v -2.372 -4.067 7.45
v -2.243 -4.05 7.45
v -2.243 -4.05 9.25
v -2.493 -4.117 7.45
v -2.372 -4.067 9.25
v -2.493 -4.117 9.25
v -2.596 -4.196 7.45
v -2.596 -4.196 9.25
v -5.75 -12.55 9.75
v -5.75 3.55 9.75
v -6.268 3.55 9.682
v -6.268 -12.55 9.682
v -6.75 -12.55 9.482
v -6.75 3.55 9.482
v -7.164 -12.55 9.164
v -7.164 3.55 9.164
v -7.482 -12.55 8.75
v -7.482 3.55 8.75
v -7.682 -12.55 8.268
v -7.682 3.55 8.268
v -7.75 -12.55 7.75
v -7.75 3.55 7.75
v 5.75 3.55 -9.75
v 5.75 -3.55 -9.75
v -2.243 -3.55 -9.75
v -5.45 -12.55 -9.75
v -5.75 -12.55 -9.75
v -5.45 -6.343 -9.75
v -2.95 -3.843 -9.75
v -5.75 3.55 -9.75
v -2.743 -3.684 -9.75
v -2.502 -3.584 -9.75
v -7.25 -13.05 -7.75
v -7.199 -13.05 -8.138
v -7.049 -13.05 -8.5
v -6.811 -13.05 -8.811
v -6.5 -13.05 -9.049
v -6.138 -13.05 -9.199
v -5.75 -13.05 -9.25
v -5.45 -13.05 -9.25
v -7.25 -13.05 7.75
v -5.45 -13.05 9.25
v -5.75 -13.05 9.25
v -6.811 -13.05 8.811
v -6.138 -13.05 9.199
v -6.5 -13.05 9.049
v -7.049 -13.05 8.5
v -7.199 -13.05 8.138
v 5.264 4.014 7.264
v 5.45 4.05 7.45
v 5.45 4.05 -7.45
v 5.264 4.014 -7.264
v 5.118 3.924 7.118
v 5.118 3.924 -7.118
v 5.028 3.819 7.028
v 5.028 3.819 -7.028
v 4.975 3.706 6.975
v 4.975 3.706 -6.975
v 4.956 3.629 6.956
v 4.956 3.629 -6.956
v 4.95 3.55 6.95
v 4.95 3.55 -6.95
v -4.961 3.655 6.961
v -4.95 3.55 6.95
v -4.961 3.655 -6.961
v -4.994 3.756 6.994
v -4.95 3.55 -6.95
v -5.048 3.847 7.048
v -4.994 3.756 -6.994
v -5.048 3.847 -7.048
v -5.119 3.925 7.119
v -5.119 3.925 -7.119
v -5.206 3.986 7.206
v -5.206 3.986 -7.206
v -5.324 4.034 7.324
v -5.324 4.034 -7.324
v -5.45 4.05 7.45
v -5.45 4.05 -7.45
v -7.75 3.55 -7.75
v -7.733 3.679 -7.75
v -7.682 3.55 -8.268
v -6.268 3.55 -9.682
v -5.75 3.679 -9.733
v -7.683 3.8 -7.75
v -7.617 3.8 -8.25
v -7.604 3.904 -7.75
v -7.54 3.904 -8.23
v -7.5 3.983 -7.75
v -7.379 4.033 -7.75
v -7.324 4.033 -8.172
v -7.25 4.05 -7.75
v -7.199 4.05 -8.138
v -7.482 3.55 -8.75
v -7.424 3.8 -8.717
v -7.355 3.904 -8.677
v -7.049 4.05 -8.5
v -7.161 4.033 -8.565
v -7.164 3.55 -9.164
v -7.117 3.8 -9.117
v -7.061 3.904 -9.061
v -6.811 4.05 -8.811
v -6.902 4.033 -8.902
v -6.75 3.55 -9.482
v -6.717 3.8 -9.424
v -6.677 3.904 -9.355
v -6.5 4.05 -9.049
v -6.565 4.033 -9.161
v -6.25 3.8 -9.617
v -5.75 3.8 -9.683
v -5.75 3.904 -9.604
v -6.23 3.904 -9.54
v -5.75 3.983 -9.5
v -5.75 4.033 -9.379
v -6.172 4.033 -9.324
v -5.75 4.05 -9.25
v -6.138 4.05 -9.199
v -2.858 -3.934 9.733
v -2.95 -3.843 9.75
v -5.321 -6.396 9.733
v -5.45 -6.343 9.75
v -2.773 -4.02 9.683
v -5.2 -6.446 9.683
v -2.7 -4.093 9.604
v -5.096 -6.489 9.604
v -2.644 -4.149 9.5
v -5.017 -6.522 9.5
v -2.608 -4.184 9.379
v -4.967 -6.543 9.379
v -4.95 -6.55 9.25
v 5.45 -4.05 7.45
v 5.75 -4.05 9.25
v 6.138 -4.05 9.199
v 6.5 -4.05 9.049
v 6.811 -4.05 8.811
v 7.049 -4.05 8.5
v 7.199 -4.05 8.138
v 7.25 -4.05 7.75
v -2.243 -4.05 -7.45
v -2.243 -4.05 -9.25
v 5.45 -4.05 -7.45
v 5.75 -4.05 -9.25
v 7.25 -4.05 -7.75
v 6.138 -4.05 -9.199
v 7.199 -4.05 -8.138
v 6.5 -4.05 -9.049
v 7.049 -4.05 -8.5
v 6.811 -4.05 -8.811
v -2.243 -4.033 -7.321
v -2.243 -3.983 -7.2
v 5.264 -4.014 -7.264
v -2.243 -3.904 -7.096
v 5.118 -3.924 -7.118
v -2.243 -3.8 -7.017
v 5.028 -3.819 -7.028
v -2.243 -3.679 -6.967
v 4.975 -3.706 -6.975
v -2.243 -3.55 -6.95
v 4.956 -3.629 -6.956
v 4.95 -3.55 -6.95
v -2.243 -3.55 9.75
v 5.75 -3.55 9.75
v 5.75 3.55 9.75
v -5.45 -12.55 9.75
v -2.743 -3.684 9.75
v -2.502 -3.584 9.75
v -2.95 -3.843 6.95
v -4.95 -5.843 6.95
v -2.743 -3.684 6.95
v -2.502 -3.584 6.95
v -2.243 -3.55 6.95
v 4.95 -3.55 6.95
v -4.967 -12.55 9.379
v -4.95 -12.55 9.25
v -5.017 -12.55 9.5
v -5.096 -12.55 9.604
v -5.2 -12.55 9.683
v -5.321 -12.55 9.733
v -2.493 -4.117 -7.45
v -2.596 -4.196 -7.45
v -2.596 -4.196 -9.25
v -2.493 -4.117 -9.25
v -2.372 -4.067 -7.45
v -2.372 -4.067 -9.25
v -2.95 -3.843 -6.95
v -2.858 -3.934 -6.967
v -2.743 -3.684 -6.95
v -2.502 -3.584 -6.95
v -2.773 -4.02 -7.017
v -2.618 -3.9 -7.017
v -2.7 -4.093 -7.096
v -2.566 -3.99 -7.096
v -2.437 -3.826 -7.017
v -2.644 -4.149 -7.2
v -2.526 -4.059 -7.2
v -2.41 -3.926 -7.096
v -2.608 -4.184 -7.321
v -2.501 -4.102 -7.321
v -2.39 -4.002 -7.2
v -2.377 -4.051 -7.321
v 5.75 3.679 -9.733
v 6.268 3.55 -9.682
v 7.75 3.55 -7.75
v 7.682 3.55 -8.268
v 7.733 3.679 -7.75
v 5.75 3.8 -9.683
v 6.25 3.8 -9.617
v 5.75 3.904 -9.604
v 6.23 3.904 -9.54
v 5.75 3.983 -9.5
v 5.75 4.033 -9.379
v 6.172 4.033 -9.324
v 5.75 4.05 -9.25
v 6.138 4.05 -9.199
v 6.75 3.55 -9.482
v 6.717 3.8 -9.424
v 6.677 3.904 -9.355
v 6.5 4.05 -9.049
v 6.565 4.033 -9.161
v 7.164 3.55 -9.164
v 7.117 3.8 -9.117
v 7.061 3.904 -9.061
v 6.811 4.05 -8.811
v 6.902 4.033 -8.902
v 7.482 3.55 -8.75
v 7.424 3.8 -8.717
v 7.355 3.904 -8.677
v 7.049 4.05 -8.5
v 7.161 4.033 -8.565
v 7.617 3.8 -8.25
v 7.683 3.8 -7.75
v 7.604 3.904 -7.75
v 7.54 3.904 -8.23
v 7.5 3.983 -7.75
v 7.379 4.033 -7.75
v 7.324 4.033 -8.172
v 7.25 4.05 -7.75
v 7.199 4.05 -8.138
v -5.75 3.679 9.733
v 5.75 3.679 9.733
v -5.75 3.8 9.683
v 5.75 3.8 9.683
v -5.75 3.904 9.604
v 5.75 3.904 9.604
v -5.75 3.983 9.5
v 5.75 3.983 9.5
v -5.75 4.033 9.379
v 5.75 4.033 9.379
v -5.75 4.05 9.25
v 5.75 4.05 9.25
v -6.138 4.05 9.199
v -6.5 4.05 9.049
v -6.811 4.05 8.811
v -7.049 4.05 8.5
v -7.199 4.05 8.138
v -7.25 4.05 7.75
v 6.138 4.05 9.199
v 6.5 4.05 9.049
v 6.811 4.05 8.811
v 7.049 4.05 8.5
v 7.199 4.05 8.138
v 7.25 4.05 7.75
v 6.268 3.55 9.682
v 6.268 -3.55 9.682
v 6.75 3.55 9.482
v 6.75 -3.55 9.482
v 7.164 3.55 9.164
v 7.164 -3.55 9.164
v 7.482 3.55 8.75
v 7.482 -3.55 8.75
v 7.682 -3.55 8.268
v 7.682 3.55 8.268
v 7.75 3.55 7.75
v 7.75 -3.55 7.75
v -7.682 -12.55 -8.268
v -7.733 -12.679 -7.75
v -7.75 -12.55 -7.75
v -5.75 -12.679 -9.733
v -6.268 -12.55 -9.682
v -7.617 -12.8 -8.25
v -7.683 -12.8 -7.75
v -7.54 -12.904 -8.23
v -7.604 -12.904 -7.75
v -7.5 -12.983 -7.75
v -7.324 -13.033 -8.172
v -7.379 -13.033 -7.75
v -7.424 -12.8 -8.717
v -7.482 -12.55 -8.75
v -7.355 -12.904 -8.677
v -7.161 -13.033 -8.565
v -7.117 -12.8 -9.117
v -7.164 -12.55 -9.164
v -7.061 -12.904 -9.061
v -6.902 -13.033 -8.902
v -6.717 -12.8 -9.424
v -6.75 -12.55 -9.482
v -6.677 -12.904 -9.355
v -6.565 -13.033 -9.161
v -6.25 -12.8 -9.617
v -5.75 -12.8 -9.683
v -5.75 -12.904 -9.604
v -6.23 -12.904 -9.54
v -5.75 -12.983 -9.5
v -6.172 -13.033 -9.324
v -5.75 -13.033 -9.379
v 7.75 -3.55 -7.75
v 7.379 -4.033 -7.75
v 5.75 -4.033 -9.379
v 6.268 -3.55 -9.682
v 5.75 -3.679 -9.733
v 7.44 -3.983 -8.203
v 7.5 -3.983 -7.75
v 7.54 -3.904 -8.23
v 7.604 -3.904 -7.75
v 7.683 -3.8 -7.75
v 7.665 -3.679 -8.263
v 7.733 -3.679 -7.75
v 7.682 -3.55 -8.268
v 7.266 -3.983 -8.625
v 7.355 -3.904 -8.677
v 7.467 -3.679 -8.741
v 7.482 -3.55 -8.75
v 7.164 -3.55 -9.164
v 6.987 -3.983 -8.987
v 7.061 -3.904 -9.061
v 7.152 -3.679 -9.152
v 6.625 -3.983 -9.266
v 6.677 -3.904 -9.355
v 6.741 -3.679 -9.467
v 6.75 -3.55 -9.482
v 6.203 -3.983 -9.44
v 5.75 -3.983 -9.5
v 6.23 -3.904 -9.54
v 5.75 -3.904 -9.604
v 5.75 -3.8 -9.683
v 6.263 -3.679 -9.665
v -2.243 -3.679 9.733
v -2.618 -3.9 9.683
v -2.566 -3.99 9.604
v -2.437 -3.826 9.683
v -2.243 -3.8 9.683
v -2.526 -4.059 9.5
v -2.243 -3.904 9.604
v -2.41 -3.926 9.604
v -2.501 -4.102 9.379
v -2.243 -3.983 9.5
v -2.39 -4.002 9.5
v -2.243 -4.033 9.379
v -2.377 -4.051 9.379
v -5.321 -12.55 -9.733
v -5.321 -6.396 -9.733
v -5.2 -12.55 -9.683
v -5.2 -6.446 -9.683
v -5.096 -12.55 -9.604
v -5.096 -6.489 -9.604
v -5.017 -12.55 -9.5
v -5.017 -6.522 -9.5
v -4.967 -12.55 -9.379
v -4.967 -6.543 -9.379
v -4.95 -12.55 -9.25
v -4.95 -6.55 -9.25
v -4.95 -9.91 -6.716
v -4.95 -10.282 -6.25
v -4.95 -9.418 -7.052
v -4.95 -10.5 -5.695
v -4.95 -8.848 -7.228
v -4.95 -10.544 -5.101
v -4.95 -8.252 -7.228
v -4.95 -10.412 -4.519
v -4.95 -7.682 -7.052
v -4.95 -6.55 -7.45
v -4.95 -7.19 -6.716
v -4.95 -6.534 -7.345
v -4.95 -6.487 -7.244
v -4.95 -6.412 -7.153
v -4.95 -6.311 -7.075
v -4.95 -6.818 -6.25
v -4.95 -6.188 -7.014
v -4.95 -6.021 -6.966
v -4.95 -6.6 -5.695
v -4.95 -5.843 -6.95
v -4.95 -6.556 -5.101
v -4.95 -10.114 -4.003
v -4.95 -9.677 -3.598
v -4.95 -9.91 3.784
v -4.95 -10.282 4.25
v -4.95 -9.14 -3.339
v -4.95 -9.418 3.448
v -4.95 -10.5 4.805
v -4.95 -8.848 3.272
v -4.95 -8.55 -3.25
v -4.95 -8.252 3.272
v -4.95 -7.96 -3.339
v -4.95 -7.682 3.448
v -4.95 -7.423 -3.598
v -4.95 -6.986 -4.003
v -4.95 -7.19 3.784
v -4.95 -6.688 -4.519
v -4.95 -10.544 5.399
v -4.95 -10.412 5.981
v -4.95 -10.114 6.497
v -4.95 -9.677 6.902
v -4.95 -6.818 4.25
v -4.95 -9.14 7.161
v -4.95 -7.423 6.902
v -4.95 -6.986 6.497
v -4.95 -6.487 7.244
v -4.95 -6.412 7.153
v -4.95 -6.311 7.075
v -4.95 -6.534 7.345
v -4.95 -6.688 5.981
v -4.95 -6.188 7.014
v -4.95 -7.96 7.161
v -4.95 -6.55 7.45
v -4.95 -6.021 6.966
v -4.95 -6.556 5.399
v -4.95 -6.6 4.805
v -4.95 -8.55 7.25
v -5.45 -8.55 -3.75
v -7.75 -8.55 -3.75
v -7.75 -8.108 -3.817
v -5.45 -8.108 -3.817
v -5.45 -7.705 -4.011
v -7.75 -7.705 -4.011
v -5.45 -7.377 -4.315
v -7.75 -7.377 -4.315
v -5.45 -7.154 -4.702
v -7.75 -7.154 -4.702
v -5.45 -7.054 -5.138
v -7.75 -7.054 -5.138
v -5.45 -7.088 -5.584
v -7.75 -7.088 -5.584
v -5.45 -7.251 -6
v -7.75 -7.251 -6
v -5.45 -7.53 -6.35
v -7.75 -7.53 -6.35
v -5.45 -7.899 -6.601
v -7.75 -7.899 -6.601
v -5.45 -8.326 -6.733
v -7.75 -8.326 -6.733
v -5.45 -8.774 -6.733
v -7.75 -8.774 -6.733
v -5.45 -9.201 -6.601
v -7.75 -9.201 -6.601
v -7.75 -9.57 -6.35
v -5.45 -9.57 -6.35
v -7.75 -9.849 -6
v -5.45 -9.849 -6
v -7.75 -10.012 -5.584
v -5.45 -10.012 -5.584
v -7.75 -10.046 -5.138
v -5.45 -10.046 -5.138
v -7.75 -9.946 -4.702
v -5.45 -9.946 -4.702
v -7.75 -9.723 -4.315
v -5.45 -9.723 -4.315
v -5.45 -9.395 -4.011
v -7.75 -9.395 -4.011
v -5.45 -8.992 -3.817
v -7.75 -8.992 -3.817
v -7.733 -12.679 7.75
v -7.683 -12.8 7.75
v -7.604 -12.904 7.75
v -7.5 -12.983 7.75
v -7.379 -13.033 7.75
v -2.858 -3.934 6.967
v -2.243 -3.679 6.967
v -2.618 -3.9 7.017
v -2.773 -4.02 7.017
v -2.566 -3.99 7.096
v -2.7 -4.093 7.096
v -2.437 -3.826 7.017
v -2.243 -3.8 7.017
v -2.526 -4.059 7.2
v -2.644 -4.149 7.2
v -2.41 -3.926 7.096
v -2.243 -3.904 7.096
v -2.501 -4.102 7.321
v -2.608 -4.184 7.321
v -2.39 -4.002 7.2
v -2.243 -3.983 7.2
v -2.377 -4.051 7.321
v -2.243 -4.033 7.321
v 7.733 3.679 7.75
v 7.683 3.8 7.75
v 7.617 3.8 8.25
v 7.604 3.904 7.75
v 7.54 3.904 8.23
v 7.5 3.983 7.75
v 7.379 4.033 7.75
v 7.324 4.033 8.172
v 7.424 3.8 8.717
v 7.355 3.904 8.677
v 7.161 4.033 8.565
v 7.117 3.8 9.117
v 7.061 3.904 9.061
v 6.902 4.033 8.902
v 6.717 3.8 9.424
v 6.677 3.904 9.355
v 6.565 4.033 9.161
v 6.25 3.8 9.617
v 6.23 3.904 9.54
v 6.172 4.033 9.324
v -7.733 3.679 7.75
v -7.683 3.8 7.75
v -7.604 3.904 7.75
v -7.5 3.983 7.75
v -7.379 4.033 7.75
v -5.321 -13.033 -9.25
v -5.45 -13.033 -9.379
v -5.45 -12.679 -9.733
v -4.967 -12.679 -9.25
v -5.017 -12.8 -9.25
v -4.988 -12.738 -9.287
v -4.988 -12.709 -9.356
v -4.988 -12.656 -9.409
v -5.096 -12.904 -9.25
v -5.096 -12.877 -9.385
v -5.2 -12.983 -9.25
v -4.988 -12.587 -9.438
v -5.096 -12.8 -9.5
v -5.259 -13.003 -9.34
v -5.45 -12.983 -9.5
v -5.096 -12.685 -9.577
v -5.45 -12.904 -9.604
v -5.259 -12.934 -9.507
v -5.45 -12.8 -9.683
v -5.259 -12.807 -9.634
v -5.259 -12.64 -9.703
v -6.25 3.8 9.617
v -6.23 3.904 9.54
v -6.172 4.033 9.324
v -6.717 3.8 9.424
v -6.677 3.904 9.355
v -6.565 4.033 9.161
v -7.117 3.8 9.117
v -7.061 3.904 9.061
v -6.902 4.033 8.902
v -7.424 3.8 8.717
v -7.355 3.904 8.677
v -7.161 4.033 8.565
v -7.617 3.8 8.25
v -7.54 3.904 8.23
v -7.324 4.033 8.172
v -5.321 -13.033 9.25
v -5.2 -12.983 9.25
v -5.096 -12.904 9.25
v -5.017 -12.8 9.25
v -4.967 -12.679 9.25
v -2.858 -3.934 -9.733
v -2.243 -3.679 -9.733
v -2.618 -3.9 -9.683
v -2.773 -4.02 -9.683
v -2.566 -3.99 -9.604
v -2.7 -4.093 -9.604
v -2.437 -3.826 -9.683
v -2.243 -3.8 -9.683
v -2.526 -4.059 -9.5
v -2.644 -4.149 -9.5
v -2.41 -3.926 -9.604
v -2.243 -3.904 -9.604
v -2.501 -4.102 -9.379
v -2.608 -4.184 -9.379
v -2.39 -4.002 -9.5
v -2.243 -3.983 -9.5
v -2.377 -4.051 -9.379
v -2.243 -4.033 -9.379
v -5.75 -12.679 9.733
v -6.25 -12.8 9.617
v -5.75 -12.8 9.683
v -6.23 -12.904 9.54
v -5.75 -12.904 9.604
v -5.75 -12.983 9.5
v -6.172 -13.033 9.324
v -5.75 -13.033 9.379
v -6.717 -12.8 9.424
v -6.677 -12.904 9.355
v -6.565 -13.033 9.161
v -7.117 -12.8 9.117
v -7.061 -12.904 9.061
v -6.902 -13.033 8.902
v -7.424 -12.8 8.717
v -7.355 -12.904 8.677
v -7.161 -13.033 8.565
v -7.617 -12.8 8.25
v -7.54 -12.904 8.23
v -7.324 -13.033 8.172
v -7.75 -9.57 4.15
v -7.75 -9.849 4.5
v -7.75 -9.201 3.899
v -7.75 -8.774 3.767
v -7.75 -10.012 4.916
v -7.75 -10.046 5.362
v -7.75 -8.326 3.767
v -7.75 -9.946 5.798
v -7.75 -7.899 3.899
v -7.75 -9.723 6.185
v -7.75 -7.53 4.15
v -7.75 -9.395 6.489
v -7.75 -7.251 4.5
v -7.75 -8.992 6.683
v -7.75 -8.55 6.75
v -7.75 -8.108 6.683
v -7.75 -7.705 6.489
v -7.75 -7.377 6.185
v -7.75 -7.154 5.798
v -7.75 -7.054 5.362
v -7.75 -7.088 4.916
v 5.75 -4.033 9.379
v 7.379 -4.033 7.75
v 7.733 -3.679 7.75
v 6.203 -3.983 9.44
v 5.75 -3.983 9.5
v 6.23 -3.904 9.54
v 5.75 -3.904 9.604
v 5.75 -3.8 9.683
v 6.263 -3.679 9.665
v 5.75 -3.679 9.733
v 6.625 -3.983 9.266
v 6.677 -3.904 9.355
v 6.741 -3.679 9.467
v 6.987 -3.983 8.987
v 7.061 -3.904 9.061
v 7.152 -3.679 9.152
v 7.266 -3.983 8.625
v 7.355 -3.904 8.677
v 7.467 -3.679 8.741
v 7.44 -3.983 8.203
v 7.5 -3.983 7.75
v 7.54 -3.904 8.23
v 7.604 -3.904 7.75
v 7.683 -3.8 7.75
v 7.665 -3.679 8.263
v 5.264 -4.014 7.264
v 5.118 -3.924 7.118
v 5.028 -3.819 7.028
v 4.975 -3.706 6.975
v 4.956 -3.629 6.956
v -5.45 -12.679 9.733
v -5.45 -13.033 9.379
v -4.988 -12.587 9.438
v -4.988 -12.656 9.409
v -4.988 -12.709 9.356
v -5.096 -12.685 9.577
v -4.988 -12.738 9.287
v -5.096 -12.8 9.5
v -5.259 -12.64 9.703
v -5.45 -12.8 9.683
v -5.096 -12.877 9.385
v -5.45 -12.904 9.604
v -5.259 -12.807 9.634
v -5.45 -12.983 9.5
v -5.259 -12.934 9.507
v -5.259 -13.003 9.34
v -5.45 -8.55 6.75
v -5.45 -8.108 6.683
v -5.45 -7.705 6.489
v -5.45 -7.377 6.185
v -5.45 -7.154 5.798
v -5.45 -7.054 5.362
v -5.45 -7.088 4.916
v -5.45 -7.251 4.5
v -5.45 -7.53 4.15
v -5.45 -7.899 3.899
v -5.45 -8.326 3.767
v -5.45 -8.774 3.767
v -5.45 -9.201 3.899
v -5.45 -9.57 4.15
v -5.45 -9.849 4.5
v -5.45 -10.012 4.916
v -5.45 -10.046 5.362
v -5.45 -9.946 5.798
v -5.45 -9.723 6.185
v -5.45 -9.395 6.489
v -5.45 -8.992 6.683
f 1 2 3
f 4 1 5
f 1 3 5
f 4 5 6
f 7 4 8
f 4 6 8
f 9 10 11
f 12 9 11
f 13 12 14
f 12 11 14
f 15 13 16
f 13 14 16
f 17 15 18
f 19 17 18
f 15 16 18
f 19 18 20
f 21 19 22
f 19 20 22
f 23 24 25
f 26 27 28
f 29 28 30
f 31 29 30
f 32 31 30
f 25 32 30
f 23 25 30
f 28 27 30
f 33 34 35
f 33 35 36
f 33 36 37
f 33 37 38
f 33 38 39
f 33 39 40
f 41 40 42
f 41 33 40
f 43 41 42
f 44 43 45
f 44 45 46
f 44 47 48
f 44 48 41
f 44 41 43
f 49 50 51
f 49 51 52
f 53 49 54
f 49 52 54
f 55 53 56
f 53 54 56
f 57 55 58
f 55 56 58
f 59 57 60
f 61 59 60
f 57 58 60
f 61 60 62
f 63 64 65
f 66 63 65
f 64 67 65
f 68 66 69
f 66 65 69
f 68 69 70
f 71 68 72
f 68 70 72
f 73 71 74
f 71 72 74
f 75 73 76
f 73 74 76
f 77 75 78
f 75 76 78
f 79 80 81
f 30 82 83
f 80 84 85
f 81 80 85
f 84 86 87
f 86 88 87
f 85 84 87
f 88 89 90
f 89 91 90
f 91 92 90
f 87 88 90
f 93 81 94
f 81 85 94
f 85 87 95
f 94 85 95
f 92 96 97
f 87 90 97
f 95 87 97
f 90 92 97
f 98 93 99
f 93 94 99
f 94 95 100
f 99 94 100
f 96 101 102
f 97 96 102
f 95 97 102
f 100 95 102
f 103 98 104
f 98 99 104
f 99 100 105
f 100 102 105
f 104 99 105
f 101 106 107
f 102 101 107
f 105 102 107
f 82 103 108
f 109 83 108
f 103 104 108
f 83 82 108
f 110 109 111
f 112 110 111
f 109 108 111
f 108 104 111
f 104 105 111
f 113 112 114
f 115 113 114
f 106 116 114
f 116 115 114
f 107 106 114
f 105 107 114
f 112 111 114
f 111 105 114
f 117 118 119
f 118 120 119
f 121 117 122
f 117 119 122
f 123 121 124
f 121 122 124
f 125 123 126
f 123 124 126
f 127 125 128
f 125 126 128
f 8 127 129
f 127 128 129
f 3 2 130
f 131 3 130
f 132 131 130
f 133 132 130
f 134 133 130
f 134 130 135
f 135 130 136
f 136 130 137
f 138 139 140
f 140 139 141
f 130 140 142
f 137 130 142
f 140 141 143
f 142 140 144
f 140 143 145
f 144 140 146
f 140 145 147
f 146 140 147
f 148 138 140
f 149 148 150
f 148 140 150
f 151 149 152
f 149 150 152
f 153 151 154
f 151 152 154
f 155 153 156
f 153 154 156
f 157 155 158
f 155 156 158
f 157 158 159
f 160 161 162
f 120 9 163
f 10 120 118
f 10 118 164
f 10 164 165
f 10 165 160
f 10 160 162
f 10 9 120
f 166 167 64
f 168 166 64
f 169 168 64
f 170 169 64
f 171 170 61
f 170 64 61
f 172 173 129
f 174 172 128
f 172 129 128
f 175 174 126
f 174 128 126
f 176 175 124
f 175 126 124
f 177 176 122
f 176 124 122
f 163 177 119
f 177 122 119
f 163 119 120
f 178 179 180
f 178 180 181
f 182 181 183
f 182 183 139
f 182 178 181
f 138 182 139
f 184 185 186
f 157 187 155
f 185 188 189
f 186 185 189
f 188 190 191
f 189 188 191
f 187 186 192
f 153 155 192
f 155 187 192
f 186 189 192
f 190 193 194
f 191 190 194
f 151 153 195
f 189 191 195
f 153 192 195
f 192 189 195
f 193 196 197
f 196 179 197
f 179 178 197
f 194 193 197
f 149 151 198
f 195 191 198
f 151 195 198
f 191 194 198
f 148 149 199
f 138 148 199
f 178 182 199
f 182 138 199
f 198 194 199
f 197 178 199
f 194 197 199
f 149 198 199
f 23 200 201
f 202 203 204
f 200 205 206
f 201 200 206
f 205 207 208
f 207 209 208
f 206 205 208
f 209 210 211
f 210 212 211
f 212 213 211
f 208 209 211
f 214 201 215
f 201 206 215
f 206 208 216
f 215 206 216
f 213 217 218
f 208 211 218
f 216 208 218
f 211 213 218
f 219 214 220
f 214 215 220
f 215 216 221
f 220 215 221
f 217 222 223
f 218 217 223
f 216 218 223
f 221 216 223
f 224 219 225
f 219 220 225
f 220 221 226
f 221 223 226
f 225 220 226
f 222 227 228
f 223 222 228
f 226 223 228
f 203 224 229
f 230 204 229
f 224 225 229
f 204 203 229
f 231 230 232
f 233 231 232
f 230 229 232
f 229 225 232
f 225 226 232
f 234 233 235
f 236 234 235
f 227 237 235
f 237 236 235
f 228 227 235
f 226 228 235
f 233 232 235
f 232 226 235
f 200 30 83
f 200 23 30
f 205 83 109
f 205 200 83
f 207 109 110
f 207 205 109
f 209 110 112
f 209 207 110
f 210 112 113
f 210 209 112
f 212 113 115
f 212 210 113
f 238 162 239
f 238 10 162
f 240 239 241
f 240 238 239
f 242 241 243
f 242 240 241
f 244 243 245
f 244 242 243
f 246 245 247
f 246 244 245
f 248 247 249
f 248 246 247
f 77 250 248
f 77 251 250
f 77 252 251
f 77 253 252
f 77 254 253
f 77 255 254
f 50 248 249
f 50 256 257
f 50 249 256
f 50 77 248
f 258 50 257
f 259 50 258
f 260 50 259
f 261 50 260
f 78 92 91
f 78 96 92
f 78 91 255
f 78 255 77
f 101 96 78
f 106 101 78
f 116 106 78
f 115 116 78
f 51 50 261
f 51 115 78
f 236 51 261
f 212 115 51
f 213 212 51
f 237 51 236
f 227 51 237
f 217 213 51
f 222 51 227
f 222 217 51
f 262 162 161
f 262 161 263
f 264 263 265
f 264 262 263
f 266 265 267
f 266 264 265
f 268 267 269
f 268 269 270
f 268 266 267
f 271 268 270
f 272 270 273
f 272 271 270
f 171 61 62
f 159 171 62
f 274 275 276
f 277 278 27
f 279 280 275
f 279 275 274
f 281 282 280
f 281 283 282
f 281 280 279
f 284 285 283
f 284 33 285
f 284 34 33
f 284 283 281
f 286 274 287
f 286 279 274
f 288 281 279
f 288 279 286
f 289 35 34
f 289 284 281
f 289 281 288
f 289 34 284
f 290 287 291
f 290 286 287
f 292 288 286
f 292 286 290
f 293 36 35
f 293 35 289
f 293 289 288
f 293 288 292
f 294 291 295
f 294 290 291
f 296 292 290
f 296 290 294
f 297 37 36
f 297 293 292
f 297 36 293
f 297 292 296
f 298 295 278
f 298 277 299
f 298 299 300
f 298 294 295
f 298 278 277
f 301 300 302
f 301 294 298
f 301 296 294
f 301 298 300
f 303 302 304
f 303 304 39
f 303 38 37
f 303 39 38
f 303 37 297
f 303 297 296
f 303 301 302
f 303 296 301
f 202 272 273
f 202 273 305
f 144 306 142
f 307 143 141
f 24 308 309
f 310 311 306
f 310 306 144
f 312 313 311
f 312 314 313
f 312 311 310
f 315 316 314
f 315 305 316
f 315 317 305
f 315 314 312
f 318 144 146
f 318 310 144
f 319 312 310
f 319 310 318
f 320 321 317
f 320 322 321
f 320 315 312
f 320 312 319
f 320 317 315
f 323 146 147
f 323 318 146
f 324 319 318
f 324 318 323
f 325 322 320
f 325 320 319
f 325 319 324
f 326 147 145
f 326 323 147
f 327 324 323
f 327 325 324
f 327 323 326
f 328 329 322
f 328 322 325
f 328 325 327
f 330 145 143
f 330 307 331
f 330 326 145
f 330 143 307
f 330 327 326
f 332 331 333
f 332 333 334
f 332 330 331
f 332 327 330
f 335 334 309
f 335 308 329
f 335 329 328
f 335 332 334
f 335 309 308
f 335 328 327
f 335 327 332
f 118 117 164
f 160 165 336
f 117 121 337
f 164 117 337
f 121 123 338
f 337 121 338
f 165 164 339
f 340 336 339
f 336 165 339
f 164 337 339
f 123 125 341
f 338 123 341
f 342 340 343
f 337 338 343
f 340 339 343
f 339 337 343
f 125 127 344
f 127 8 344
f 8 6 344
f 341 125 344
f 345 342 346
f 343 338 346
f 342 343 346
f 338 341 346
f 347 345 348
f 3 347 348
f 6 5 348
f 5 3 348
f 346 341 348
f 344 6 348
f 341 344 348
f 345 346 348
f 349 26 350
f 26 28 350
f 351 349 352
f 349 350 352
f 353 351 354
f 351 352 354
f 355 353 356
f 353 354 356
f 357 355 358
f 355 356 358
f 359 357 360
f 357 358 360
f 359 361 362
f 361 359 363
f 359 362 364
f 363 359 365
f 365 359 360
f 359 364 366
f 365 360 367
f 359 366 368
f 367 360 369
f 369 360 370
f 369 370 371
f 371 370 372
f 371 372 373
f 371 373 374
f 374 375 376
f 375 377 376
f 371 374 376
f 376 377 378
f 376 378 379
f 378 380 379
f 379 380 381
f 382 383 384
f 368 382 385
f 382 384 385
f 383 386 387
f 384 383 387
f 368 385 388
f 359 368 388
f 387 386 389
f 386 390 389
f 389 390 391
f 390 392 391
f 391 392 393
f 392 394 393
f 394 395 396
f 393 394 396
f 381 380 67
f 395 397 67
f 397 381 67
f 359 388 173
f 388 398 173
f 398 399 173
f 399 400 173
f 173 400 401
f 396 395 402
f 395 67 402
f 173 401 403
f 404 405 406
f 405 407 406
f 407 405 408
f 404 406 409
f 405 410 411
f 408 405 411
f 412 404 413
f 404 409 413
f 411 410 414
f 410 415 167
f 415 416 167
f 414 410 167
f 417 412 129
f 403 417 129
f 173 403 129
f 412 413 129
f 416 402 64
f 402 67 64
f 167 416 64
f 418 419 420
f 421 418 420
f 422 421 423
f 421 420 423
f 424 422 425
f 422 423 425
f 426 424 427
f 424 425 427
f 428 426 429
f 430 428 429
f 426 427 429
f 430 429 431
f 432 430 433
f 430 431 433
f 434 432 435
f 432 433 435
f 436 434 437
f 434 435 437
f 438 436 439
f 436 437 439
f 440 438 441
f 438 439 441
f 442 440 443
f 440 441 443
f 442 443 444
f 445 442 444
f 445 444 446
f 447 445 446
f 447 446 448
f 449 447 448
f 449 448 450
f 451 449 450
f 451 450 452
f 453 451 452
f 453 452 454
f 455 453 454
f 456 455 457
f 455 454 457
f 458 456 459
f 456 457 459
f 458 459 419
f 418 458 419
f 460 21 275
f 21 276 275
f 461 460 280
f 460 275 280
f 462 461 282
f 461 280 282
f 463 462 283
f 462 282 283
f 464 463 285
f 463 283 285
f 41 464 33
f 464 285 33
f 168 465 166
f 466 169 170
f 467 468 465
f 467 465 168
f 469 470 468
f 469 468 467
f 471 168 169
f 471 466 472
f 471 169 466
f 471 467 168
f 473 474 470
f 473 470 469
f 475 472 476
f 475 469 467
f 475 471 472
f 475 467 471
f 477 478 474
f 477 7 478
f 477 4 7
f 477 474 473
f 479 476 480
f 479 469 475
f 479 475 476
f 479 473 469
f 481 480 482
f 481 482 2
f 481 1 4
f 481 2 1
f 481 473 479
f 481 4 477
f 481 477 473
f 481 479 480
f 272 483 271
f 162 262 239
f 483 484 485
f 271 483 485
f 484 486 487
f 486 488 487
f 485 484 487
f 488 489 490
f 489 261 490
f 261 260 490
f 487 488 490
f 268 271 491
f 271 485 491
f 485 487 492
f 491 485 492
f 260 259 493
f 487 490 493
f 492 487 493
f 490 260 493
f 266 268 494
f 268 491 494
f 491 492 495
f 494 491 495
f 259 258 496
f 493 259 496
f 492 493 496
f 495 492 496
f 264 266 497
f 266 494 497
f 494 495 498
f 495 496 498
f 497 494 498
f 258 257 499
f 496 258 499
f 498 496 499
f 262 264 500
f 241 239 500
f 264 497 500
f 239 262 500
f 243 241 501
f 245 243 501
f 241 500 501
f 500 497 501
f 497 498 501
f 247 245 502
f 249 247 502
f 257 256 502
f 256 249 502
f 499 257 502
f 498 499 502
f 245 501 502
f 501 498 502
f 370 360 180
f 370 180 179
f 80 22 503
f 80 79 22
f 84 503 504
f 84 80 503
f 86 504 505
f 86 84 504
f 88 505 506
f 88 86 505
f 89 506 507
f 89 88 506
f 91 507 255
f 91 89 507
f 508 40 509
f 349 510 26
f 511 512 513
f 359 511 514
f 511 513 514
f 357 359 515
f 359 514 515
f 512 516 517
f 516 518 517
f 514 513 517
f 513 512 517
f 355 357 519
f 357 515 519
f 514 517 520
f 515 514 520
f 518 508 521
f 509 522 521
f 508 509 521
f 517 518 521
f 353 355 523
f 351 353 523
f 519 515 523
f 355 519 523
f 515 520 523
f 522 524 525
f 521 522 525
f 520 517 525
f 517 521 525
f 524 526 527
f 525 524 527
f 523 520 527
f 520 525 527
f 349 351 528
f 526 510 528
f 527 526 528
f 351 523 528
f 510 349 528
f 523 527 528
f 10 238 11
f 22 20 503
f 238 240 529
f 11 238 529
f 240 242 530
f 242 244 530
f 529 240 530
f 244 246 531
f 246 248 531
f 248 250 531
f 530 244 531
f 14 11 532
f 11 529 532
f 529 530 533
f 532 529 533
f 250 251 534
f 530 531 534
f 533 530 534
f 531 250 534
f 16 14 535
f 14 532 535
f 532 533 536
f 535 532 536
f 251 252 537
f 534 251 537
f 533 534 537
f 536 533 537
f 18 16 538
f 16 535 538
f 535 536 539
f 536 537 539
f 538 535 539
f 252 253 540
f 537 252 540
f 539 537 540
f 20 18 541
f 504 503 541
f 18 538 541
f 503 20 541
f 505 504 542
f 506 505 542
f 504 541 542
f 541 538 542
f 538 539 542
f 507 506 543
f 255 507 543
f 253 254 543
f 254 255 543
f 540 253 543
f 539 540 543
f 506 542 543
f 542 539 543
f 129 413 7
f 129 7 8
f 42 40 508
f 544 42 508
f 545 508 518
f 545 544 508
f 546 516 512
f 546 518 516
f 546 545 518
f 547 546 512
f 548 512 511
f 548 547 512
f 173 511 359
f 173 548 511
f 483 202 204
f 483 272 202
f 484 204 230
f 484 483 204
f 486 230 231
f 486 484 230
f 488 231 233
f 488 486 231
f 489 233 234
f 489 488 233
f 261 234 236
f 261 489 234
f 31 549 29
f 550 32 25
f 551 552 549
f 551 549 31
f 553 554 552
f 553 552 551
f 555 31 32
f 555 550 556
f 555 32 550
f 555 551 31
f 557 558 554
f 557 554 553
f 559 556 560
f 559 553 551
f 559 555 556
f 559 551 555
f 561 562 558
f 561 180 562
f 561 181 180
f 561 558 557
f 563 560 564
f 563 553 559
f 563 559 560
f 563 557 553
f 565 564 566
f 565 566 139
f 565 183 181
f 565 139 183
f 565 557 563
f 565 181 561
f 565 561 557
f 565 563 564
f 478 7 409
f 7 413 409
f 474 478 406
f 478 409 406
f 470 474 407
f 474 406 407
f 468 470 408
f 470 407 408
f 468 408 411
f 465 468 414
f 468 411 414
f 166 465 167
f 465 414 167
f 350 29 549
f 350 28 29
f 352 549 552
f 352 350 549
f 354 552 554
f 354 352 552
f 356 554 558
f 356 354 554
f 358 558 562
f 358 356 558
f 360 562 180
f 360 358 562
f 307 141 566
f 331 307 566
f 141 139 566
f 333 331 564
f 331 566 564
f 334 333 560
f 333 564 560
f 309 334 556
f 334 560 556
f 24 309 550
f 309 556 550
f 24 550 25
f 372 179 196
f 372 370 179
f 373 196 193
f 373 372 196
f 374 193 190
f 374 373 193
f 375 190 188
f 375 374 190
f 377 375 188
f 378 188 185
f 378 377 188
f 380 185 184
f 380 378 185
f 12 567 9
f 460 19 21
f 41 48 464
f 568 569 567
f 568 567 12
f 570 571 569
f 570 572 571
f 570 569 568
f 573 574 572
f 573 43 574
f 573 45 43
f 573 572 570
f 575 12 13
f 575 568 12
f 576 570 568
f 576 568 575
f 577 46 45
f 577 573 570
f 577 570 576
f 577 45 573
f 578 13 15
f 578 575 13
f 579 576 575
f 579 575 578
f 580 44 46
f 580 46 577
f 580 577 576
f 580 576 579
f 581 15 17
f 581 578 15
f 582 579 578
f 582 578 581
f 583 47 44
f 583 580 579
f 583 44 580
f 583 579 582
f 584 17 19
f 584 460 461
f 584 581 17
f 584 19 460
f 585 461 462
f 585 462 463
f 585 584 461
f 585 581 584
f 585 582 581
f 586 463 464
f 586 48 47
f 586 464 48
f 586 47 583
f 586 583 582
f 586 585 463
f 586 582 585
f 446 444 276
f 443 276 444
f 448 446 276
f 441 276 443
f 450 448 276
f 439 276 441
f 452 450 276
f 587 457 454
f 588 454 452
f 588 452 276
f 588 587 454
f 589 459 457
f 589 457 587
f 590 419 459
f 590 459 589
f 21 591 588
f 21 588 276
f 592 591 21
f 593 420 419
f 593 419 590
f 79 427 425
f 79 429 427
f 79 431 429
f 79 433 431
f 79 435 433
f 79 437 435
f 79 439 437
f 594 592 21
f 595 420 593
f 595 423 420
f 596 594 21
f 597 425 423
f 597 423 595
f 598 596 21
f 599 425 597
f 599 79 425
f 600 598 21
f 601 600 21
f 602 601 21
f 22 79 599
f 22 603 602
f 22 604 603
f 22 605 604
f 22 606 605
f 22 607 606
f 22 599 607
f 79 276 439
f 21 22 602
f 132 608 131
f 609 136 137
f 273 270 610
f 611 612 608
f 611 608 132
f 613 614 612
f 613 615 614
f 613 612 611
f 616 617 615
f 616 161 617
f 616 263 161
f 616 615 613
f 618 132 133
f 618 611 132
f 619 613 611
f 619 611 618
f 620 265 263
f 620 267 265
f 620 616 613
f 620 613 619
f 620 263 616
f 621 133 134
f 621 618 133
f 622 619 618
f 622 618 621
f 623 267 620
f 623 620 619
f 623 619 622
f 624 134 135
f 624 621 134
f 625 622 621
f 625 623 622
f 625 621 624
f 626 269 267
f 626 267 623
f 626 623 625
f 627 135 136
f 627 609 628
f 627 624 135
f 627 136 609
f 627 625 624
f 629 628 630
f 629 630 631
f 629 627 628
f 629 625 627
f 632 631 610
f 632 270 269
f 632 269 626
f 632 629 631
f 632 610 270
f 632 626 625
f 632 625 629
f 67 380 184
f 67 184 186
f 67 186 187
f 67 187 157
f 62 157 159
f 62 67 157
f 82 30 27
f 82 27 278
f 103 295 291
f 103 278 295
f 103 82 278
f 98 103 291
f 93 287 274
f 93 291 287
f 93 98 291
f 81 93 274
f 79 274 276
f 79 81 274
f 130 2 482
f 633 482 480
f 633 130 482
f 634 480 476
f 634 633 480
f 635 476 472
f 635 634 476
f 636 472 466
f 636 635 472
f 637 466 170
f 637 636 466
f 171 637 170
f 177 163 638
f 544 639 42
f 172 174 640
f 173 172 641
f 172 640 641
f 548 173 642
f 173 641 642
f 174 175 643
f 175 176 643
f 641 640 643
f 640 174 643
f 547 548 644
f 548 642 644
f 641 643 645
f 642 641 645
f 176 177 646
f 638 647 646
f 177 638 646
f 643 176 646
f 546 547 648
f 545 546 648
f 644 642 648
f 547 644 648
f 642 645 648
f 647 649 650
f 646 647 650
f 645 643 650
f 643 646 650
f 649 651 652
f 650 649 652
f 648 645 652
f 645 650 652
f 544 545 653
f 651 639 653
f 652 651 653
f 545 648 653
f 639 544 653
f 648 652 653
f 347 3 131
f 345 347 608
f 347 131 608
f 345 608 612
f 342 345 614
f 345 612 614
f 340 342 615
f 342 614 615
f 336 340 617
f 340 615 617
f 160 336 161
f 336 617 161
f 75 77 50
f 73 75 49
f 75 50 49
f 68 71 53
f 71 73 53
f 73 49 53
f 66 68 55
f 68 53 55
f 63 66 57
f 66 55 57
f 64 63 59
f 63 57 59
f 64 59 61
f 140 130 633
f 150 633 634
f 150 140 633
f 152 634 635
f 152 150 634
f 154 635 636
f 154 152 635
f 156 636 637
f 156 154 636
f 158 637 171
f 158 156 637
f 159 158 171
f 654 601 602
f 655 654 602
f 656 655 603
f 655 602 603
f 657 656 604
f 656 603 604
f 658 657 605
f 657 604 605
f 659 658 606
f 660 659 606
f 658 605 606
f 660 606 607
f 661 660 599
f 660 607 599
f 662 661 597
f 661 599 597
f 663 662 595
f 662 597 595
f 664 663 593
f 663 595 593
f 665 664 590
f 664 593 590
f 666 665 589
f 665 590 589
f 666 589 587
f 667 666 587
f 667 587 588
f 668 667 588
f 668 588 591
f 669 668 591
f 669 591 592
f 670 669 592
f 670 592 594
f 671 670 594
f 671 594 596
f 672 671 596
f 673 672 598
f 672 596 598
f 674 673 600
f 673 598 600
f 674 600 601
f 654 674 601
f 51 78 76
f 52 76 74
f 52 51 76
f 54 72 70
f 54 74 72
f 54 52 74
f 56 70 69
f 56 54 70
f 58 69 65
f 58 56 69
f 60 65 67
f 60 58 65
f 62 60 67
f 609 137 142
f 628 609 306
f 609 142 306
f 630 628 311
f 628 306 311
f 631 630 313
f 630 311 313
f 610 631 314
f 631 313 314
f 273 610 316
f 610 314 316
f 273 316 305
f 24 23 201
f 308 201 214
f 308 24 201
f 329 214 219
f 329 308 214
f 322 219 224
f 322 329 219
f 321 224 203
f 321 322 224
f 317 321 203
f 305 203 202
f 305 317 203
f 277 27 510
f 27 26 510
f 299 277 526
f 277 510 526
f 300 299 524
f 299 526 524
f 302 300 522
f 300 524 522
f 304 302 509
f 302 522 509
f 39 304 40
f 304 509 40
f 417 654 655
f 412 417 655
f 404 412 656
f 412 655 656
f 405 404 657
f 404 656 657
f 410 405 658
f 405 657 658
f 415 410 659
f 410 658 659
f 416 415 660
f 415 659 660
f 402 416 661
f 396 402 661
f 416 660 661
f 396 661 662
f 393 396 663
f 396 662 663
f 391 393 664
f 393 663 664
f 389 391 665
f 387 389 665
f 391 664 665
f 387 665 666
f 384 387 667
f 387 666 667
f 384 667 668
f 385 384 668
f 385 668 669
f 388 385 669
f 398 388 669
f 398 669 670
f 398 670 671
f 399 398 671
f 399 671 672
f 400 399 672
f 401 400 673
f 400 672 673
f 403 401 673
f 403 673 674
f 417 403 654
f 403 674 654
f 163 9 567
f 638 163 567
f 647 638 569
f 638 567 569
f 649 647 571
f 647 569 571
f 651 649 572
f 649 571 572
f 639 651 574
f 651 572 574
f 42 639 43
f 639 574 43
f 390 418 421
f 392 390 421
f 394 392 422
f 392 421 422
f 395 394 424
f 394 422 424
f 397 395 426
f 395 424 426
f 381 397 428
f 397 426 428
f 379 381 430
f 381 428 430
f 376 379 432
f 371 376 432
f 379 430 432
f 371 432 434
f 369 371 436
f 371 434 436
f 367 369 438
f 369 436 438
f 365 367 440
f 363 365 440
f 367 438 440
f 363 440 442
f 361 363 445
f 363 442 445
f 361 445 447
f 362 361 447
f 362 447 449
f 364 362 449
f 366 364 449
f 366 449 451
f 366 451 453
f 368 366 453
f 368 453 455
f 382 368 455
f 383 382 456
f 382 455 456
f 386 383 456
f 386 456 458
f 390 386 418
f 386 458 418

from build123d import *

# Parameters (mm, degrees)
SKETCH1_W           = 15.5
SKETCH1_H           = 19.5
SKETCH1_W_2         = 9.9
SKETCH1_H_2         = 13.9
BOSS_EXTRUDE1_DEPTH = 4.05
SKETCH2_W           = 19.5
SKETCH2_H           = 9
SKETCH2_R           = 1.5
BOSS_EXTRUDE2_DEPTH = 2.8
CHAMFER1_SIZE       = 2.5
FILLET1_R           = 2
FILLET2_R           = 0.5
CHAMFER2_SIZE       = 0.5


with BuildPart() as part:
    # Sketch1 → Boss-Extrude1 (new body, symmetric)
    with BuildSketch(Plane(origin=(0, 0, 0), x_dir=(1, 0, 0), z_dir=(0, 1, 0))):
        Rectangle(SKETCH1_W, SKETCH1_H)
        Rectangle(SKETCH1_W_2, SKETCH1_H_2, mode=Mode.SUBTRACT)
    extrude(amount=BOSS_EXTRUDE1_DEPTH, both=True)

    # Sketch2 → Boss-Extrude2 (add)
    with BuildSketch(Plane.ZY.offset(7.75)):
        with Locations((0, -8.55)):
            Rectangle(SKETCH2_W, SKETCH2_H)
        with Locations((-5.25, -8.55)):
            Circle(SKETCH2_R, mode=Mode.SUBTRACT)
        with Locations((5.25, -8.55)):
            Circle(SKETCH2_R, mode=Mode.SUBTRACT)
    extrude(amount=-BOSS_EXTRUDE2_DEPTH)

    # Chamfer1
    chamfer1_edges = [part.edges().sort_by_distance(p)[0] for p in [
        (-4.95, -4.05, -8.35),
        (-4.95, -4.05, 8.35),
    ]]
    chamfer(chamfer1_edges, length=CHAMFER1_SIZE)

    # Fillet1
    fillet1_edges = [part.edges().sort_by_distance(p)[0] for p in [
        (-7.75, -4.5, -9.75),
        (7.75, 0, -9.75),
        (7.75, 0, 9.75),
        (-7.75, -4.5, 9.75),
    ]]
    fillet(fillet1_edges, radius=FILLET1_R)

    # Fillet2
    fillet2_edges = [part.edges().sort_by_distance(p)[0] for p in [
        (4.95, -4.05, 0),
        (1.25, -4.05, -6.95),
        (-4.95, 4.05, 0),
        (0, 4.05, 6.95),
        (4.95, 4.05, 0),
        (0, 4.05, -6.95),
        (-5.35, -13.05, -9.75),
        (-4.95, -9.8, 9.75),
        (-4.95, -13.05, 0),
        (-5.35, -13.05, 9.75),
        (1.65, -4.05, 9.75),
        (1.25, -4.05, 6.95),
        (-2.45, -4.05, 8.35),
        (-2.45, -4.05, -8.35),
        (-4.95, -9.8, -9.75),
        (-3.7, -5.3, -9.75),
        (-3.7, -5.3, -6.95),
        (-3.7, -5.3, 6.95),
        (-3.7, -5.3, 9.75),
        (1.65, -4.05, -9.75),
        (0, 4.05, -9.75),
        (7.75, -4.05, 0),
        (7.164213562, -4.05, 9.164213562),
        (7.164213562, -4.05, -9.164213562),
        (7.75, 4.05, 0),
        (-7.75, 4.05, 0),
        (0, 4.05, 9.75),
        (-7.164213562, 4.05, 9.164213562),
        (-7.164213562, 4.05, -9.164213562),
        (7.164213562, 4.05, 9.164213562),
        (7.164213562, 4.05, -9.164213562),
        (-7.75, -13.05, 0),
        (-7.164213562, -13.05, 9.164213562),
        (-7.164213562, -13.05, -9.164213562),
    ]]
    fillet(fillet2_edges, radius=FILLET2_R)

    # Chamfer2
    chamfer2_edges = [part.edges().sort_by_distance(p)[0] for p in [
        (-4.95, -8.55, 3.75),
        (-4.95, -8.55, -6.75),
    ]]
    chamfer(chamfer2_edges, length=CHAMFER2_SIZE)


solid = part.part
